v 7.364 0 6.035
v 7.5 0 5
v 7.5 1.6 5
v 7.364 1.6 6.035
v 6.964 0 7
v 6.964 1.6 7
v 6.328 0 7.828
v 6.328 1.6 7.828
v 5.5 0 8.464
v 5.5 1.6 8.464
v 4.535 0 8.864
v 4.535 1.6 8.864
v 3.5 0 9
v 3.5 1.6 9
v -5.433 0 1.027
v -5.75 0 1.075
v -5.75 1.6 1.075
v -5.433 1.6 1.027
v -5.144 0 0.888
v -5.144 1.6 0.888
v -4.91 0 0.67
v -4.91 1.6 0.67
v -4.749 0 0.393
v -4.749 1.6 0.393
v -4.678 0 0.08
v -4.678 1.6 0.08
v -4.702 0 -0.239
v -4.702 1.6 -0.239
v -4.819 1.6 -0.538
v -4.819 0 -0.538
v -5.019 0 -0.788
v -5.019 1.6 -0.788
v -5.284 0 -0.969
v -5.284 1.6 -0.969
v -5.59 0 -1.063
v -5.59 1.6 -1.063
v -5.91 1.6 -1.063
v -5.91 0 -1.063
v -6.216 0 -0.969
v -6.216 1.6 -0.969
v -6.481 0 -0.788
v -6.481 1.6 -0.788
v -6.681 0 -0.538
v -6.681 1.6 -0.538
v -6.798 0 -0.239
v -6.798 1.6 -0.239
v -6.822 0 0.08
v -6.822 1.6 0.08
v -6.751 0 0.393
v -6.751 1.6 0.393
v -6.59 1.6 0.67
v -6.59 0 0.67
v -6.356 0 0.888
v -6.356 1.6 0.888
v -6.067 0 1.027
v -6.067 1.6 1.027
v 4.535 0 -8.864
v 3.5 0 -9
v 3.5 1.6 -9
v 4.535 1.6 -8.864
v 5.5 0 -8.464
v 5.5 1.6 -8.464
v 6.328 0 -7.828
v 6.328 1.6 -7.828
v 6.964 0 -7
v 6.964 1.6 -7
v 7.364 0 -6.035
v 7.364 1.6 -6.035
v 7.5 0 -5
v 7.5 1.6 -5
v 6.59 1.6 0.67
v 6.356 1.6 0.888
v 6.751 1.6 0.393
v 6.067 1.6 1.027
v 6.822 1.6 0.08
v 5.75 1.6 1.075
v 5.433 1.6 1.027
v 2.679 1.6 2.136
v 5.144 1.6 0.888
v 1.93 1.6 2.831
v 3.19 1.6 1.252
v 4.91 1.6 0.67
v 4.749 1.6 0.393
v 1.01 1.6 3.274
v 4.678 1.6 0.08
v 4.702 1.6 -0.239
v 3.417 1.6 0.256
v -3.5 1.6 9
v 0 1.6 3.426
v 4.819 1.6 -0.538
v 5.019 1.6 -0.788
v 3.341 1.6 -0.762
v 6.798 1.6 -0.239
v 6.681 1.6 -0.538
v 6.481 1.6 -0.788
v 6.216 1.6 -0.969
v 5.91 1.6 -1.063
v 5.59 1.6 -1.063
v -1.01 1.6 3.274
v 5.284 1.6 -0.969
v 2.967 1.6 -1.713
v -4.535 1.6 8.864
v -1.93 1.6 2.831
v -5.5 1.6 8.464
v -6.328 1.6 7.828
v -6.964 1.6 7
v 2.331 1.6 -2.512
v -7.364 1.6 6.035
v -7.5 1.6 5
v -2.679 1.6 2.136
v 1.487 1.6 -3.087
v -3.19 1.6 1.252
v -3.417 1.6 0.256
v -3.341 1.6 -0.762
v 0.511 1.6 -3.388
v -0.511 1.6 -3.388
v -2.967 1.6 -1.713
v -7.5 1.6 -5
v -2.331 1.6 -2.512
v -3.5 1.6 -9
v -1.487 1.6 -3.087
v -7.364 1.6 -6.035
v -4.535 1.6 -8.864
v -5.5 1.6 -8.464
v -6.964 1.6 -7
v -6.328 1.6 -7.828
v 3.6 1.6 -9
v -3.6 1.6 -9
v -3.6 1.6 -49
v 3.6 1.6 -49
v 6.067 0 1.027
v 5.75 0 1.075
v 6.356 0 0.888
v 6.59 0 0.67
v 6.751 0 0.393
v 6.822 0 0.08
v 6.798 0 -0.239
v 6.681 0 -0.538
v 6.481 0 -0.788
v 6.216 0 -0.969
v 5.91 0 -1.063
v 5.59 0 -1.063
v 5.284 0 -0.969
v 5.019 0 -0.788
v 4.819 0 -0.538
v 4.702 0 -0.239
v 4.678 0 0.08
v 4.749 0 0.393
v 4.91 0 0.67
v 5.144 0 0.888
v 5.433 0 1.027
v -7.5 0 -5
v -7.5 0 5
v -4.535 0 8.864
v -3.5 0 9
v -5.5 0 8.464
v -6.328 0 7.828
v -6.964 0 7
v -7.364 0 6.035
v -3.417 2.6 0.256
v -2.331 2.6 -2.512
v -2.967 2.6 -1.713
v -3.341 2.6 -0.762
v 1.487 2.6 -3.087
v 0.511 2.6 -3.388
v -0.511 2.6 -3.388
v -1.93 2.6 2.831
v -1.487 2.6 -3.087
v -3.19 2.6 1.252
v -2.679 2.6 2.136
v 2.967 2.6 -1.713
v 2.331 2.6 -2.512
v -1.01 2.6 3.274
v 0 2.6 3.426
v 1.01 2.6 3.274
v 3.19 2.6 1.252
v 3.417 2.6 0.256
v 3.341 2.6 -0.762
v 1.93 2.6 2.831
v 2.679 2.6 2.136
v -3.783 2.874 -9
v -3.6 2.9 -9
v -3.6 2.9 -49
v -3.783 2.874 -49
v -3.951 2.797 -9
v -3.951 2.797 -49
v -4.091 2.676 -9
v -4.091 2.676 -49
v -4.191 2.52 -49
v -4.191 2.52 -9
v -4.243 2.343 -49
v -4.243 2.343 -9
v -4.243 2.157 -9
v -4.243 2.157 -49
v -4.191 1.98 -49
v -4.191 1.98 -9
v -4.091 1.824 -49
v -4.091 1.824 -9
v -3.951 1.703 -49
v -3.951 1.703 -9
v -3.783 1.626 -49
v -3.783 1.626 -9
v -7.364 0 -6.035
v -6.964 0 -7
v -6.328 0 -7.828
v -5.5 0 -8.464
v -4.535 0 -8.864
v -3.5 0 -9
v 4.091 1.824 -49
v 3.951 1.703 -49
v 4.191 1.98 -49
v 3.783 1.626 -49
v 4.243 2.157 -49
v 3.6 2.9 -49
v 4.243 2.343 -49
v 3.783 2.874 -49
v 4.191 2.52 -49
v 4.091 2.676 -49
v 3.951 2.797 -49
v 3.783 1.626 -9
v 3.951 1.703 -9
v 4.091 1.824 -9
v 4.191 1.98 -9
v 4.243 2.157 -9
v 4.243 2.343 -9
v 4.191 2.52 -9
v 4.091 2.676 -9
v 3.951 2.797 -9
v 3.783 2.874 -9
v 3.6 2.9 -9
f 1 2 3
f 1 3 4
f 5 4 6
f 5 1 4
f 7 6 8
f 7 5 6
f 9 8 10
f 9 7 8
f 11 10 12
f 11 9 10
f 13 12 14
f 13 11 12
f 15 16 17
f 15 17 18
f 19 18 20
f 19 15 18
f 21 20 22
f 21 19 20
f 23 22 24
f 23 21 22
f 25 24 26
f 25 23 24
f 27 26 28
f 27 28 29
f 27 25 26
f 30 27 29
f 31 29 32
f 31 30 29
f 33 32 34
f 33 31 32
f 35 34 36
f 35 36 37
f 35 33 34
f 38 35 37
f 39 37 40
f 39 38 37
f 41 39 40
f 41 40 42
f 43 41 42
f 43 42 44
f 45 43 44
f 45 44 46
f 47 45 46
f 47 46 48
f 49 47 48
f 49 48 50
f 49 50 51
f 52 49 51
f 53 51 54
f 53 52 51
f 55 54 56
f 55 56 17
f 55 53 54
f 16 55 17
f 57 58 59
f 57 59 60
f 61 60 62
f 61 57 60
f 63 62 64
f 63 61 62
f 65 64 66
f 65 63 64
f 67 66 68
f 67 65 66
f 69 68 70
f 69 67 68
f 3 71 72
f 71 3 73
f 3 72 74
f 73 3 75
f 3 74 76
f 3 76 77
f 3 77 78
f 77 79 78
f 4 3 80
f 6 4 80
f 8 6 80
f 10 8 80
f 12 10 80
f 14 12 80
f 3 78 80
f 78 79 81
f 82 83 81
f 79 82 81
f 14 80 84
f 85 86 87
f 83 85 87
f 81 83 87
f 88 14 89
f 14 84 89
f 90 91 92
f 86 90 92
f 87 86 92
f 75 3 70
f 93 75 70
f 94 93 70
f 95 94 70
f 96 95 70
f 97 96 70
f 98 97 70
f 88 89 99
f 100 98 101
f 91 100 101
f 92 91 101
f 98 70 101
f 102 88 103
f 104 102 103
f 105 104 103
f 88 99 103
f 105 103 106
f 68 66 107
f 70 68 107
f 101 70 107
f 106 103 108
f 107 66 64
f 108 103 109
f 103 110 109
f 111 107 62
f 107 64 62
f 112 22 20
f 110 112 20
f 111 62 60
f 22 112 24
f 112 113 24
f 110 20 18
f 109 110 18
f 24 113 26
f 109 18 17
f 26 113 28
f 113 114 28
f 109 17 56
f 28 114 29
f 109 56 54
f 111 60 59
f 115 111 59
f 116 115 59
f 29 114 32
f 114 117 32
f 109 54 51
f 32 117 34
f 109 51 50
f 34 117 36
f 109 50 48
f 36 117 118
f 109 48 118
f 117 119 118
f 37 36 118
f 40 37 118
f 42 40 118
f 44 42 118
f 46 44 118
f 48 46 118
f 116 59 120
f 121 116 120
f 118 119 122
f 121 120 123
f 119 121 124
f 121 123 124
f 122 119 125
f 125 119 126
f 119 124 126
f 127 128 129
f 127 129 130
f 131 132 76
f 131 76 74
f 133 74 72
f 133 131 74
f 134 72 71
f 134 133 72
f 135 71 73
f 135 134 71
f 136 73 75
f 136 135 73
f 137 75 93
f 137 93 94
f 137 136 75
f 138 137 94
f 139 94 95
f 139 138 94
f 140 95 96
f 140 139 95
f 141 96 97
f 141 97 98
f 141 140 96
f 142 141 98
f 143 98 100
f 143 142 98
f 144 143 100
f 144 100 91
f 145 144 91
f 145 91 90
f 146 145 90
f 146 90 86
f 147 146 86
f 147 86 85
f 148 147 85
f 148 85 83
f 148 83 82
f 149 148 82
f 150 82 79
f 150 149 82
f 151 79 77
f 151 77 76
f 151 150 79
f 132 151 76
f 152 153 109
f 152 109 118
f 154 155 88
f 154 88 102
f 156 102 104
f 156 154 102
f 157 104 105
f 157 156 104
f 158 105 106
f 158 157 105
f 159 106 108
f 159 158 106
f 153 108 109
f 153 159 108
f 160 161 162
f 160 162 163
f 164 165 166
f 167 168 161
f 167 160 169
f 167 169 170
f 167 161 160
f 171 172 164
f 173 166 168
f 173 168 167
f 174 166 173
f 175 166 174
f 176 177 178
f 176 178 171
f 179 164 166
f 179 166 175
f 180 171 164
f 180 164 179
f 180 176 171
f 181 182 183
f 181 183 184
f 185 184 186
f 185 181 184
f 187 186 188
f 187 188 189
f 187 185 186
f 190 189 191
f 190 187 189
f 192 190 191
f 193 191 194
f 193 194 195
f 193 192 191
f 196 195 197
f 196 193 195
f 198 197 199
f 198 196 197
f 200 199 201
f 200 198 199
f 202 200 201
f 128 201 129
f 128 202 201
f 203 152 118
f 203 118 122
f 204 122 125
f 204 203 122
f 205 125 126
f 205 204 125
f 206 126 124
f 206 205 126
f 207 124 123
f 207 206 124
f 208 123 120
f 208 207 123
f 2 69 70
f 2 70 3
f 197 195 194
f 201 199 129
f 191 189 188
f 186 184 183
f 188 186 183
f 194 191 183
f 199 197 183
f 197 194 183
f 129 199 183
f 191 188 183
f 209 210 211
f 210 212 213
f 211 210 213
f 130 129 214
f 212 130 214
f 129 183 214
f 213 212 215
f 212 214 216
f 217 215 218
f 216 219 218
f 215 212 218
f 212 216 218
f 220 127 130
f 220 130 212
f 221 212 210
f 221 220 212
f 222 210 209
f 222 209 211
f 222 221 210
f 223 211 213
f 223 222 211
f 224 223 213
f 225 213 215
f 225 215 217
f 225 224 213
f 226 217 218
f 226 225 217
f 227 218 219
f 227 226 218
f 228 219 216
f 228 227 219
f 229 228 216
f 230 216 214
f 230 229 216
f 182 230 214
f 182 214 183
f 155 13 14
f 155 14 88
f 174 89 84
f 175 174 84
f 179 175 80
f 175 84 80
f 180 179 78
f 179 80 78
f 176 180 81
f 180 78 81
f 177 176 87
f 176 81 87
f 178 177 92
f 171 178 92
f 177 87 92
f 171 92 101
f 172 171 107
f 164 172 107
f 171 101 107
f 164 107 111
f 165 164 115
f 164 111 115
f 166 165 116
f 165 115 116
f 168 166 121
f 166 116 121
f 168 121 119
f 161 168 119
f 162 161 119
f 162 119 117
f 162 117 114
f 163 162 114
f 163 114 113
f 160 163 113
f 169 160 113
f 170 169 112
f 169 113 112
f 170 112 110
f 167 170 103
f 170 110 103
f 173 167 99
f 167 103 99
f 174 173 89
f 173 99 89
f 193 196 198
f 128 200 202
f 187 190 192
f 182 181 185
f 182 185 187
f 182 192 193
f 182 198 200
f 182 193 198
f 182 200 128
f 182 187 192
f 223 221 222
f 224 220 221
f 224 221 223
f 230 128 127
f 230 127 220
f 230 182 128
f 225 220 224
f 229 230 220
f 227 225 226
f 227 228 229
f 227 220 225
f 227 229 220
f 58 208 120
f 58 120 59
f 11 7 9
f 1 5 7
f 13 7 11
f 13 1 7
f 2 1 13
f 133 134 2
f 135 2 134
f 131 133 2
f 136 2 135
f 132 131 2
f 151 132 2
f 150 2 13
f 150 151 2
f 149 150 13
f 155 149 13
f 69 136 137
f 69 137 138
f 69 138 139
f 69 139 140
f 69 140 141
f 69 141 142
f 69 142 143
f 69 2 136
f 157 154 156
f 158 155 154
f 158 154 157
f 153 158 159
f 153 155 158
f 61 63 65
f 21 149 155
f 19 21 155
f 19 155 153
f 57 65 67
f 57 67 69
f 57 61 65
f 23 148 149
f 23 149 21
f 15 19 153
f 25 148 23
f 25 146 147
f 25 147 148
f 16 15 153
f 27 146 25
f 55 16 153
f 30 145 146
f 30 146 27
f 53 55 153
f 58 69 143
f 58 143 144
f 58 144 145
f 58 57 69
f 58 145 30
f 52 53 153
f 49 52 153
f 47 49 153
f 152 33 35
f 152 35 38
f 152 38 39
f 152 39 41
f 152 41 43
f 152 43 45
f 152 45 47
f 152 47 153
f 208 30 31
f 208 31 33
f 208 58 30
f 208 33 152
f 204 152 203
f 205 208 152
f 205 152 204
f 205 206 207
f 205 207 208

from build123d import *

# Parameters (mm, degrees)
SKETCH1_R           = 1.075
BOSS_EXTRUDE1_DEPTH = 1.6
SKETCH2_R           = 3.426475787
BOSS_EXTRUDE2_DEPTH = 1
BOSS_EXTRUDE3_DEPTH = 40


with BuildPart() as part:
    # Sketch1 → Boss-Extrude1 (new body)
    with BuildSketch(Plane(origin=(0, 0, 0), x_dir=(1, 0, 0), z_dir=(0, 1, 0))):
        with BuildLine():
            Line((-3.5, 9), (3.5, 9))
            ThreePointArc((3.5, 9), (6.328427125, 7.828427125), (7.5, 5))
            Line((7.5, 5), (7.5, -5))
            ThreePointArc((7.5, -5), (6.328427125, -7.828427125), (3.5, -9))
            Line((3.5, -9), (-3.5, -9))
            ThreePointArc((-3.5, -9), (-6.328427125, -7.828427125), (-7.5, -5))
            Line((-7.5, -5), (-7.5, 5))
            ThreePointArc((-7.5, 5), (-6.328427125, 7.828427125), (-3.5, 9))
        make_face()
        with Locations(Location((-5.75, 0, 0), (0, 0, 270))):
            Circle(SKETCH1_R, mode=Mode.SUBTRACT)
        with Locations(Location((5.75, 0, 0), (0, 0, 270))):
            Circle(SKETCH1_R, mode=Mode.SUBTRACT)
    extrude(amount=BOSS_EXTRUDE1_DEPTH)

    # Sketch2 → Boss-Extrude2 (add)
    with BuildSketch(Plane(origin=(0, 1.6, 0), x_dir=(1, 0, 0), z_dir=(0, 1, 0))):
        with Locations(Location((0, 0, 0), (0, 0, 270))):
            Circle(SKETCH2_R)
    extrude(amount=BOSS_EXTRUDE2_DEPTH)


with BuildPart() as body_2:
    # Sketch4 → Boss-Extrude3 (new body)
    with BuildSketch(Plane(origin=(0, 0, -9), x_dir=(-1, 0, 0), z_dir=(0, 0, -1))):
        with BuildLine():
            Line((3.6, 1.6), (-3.6, 1.6))
            ThreePointArc((-3.6, 1.6), (-4.25, 2.25), (-3.6, 2.9))
            Line((-3.6, 2.9), (3.6, 2.9))
            ThreePointArc((3.6, 2.9), (4.25, 2.25), (3.6, 1.6))
        make_face()
    extrude(amount=BOSS_EXTRUDE3_DEPTH)


solid = Compound([part.part, body_2.part])
